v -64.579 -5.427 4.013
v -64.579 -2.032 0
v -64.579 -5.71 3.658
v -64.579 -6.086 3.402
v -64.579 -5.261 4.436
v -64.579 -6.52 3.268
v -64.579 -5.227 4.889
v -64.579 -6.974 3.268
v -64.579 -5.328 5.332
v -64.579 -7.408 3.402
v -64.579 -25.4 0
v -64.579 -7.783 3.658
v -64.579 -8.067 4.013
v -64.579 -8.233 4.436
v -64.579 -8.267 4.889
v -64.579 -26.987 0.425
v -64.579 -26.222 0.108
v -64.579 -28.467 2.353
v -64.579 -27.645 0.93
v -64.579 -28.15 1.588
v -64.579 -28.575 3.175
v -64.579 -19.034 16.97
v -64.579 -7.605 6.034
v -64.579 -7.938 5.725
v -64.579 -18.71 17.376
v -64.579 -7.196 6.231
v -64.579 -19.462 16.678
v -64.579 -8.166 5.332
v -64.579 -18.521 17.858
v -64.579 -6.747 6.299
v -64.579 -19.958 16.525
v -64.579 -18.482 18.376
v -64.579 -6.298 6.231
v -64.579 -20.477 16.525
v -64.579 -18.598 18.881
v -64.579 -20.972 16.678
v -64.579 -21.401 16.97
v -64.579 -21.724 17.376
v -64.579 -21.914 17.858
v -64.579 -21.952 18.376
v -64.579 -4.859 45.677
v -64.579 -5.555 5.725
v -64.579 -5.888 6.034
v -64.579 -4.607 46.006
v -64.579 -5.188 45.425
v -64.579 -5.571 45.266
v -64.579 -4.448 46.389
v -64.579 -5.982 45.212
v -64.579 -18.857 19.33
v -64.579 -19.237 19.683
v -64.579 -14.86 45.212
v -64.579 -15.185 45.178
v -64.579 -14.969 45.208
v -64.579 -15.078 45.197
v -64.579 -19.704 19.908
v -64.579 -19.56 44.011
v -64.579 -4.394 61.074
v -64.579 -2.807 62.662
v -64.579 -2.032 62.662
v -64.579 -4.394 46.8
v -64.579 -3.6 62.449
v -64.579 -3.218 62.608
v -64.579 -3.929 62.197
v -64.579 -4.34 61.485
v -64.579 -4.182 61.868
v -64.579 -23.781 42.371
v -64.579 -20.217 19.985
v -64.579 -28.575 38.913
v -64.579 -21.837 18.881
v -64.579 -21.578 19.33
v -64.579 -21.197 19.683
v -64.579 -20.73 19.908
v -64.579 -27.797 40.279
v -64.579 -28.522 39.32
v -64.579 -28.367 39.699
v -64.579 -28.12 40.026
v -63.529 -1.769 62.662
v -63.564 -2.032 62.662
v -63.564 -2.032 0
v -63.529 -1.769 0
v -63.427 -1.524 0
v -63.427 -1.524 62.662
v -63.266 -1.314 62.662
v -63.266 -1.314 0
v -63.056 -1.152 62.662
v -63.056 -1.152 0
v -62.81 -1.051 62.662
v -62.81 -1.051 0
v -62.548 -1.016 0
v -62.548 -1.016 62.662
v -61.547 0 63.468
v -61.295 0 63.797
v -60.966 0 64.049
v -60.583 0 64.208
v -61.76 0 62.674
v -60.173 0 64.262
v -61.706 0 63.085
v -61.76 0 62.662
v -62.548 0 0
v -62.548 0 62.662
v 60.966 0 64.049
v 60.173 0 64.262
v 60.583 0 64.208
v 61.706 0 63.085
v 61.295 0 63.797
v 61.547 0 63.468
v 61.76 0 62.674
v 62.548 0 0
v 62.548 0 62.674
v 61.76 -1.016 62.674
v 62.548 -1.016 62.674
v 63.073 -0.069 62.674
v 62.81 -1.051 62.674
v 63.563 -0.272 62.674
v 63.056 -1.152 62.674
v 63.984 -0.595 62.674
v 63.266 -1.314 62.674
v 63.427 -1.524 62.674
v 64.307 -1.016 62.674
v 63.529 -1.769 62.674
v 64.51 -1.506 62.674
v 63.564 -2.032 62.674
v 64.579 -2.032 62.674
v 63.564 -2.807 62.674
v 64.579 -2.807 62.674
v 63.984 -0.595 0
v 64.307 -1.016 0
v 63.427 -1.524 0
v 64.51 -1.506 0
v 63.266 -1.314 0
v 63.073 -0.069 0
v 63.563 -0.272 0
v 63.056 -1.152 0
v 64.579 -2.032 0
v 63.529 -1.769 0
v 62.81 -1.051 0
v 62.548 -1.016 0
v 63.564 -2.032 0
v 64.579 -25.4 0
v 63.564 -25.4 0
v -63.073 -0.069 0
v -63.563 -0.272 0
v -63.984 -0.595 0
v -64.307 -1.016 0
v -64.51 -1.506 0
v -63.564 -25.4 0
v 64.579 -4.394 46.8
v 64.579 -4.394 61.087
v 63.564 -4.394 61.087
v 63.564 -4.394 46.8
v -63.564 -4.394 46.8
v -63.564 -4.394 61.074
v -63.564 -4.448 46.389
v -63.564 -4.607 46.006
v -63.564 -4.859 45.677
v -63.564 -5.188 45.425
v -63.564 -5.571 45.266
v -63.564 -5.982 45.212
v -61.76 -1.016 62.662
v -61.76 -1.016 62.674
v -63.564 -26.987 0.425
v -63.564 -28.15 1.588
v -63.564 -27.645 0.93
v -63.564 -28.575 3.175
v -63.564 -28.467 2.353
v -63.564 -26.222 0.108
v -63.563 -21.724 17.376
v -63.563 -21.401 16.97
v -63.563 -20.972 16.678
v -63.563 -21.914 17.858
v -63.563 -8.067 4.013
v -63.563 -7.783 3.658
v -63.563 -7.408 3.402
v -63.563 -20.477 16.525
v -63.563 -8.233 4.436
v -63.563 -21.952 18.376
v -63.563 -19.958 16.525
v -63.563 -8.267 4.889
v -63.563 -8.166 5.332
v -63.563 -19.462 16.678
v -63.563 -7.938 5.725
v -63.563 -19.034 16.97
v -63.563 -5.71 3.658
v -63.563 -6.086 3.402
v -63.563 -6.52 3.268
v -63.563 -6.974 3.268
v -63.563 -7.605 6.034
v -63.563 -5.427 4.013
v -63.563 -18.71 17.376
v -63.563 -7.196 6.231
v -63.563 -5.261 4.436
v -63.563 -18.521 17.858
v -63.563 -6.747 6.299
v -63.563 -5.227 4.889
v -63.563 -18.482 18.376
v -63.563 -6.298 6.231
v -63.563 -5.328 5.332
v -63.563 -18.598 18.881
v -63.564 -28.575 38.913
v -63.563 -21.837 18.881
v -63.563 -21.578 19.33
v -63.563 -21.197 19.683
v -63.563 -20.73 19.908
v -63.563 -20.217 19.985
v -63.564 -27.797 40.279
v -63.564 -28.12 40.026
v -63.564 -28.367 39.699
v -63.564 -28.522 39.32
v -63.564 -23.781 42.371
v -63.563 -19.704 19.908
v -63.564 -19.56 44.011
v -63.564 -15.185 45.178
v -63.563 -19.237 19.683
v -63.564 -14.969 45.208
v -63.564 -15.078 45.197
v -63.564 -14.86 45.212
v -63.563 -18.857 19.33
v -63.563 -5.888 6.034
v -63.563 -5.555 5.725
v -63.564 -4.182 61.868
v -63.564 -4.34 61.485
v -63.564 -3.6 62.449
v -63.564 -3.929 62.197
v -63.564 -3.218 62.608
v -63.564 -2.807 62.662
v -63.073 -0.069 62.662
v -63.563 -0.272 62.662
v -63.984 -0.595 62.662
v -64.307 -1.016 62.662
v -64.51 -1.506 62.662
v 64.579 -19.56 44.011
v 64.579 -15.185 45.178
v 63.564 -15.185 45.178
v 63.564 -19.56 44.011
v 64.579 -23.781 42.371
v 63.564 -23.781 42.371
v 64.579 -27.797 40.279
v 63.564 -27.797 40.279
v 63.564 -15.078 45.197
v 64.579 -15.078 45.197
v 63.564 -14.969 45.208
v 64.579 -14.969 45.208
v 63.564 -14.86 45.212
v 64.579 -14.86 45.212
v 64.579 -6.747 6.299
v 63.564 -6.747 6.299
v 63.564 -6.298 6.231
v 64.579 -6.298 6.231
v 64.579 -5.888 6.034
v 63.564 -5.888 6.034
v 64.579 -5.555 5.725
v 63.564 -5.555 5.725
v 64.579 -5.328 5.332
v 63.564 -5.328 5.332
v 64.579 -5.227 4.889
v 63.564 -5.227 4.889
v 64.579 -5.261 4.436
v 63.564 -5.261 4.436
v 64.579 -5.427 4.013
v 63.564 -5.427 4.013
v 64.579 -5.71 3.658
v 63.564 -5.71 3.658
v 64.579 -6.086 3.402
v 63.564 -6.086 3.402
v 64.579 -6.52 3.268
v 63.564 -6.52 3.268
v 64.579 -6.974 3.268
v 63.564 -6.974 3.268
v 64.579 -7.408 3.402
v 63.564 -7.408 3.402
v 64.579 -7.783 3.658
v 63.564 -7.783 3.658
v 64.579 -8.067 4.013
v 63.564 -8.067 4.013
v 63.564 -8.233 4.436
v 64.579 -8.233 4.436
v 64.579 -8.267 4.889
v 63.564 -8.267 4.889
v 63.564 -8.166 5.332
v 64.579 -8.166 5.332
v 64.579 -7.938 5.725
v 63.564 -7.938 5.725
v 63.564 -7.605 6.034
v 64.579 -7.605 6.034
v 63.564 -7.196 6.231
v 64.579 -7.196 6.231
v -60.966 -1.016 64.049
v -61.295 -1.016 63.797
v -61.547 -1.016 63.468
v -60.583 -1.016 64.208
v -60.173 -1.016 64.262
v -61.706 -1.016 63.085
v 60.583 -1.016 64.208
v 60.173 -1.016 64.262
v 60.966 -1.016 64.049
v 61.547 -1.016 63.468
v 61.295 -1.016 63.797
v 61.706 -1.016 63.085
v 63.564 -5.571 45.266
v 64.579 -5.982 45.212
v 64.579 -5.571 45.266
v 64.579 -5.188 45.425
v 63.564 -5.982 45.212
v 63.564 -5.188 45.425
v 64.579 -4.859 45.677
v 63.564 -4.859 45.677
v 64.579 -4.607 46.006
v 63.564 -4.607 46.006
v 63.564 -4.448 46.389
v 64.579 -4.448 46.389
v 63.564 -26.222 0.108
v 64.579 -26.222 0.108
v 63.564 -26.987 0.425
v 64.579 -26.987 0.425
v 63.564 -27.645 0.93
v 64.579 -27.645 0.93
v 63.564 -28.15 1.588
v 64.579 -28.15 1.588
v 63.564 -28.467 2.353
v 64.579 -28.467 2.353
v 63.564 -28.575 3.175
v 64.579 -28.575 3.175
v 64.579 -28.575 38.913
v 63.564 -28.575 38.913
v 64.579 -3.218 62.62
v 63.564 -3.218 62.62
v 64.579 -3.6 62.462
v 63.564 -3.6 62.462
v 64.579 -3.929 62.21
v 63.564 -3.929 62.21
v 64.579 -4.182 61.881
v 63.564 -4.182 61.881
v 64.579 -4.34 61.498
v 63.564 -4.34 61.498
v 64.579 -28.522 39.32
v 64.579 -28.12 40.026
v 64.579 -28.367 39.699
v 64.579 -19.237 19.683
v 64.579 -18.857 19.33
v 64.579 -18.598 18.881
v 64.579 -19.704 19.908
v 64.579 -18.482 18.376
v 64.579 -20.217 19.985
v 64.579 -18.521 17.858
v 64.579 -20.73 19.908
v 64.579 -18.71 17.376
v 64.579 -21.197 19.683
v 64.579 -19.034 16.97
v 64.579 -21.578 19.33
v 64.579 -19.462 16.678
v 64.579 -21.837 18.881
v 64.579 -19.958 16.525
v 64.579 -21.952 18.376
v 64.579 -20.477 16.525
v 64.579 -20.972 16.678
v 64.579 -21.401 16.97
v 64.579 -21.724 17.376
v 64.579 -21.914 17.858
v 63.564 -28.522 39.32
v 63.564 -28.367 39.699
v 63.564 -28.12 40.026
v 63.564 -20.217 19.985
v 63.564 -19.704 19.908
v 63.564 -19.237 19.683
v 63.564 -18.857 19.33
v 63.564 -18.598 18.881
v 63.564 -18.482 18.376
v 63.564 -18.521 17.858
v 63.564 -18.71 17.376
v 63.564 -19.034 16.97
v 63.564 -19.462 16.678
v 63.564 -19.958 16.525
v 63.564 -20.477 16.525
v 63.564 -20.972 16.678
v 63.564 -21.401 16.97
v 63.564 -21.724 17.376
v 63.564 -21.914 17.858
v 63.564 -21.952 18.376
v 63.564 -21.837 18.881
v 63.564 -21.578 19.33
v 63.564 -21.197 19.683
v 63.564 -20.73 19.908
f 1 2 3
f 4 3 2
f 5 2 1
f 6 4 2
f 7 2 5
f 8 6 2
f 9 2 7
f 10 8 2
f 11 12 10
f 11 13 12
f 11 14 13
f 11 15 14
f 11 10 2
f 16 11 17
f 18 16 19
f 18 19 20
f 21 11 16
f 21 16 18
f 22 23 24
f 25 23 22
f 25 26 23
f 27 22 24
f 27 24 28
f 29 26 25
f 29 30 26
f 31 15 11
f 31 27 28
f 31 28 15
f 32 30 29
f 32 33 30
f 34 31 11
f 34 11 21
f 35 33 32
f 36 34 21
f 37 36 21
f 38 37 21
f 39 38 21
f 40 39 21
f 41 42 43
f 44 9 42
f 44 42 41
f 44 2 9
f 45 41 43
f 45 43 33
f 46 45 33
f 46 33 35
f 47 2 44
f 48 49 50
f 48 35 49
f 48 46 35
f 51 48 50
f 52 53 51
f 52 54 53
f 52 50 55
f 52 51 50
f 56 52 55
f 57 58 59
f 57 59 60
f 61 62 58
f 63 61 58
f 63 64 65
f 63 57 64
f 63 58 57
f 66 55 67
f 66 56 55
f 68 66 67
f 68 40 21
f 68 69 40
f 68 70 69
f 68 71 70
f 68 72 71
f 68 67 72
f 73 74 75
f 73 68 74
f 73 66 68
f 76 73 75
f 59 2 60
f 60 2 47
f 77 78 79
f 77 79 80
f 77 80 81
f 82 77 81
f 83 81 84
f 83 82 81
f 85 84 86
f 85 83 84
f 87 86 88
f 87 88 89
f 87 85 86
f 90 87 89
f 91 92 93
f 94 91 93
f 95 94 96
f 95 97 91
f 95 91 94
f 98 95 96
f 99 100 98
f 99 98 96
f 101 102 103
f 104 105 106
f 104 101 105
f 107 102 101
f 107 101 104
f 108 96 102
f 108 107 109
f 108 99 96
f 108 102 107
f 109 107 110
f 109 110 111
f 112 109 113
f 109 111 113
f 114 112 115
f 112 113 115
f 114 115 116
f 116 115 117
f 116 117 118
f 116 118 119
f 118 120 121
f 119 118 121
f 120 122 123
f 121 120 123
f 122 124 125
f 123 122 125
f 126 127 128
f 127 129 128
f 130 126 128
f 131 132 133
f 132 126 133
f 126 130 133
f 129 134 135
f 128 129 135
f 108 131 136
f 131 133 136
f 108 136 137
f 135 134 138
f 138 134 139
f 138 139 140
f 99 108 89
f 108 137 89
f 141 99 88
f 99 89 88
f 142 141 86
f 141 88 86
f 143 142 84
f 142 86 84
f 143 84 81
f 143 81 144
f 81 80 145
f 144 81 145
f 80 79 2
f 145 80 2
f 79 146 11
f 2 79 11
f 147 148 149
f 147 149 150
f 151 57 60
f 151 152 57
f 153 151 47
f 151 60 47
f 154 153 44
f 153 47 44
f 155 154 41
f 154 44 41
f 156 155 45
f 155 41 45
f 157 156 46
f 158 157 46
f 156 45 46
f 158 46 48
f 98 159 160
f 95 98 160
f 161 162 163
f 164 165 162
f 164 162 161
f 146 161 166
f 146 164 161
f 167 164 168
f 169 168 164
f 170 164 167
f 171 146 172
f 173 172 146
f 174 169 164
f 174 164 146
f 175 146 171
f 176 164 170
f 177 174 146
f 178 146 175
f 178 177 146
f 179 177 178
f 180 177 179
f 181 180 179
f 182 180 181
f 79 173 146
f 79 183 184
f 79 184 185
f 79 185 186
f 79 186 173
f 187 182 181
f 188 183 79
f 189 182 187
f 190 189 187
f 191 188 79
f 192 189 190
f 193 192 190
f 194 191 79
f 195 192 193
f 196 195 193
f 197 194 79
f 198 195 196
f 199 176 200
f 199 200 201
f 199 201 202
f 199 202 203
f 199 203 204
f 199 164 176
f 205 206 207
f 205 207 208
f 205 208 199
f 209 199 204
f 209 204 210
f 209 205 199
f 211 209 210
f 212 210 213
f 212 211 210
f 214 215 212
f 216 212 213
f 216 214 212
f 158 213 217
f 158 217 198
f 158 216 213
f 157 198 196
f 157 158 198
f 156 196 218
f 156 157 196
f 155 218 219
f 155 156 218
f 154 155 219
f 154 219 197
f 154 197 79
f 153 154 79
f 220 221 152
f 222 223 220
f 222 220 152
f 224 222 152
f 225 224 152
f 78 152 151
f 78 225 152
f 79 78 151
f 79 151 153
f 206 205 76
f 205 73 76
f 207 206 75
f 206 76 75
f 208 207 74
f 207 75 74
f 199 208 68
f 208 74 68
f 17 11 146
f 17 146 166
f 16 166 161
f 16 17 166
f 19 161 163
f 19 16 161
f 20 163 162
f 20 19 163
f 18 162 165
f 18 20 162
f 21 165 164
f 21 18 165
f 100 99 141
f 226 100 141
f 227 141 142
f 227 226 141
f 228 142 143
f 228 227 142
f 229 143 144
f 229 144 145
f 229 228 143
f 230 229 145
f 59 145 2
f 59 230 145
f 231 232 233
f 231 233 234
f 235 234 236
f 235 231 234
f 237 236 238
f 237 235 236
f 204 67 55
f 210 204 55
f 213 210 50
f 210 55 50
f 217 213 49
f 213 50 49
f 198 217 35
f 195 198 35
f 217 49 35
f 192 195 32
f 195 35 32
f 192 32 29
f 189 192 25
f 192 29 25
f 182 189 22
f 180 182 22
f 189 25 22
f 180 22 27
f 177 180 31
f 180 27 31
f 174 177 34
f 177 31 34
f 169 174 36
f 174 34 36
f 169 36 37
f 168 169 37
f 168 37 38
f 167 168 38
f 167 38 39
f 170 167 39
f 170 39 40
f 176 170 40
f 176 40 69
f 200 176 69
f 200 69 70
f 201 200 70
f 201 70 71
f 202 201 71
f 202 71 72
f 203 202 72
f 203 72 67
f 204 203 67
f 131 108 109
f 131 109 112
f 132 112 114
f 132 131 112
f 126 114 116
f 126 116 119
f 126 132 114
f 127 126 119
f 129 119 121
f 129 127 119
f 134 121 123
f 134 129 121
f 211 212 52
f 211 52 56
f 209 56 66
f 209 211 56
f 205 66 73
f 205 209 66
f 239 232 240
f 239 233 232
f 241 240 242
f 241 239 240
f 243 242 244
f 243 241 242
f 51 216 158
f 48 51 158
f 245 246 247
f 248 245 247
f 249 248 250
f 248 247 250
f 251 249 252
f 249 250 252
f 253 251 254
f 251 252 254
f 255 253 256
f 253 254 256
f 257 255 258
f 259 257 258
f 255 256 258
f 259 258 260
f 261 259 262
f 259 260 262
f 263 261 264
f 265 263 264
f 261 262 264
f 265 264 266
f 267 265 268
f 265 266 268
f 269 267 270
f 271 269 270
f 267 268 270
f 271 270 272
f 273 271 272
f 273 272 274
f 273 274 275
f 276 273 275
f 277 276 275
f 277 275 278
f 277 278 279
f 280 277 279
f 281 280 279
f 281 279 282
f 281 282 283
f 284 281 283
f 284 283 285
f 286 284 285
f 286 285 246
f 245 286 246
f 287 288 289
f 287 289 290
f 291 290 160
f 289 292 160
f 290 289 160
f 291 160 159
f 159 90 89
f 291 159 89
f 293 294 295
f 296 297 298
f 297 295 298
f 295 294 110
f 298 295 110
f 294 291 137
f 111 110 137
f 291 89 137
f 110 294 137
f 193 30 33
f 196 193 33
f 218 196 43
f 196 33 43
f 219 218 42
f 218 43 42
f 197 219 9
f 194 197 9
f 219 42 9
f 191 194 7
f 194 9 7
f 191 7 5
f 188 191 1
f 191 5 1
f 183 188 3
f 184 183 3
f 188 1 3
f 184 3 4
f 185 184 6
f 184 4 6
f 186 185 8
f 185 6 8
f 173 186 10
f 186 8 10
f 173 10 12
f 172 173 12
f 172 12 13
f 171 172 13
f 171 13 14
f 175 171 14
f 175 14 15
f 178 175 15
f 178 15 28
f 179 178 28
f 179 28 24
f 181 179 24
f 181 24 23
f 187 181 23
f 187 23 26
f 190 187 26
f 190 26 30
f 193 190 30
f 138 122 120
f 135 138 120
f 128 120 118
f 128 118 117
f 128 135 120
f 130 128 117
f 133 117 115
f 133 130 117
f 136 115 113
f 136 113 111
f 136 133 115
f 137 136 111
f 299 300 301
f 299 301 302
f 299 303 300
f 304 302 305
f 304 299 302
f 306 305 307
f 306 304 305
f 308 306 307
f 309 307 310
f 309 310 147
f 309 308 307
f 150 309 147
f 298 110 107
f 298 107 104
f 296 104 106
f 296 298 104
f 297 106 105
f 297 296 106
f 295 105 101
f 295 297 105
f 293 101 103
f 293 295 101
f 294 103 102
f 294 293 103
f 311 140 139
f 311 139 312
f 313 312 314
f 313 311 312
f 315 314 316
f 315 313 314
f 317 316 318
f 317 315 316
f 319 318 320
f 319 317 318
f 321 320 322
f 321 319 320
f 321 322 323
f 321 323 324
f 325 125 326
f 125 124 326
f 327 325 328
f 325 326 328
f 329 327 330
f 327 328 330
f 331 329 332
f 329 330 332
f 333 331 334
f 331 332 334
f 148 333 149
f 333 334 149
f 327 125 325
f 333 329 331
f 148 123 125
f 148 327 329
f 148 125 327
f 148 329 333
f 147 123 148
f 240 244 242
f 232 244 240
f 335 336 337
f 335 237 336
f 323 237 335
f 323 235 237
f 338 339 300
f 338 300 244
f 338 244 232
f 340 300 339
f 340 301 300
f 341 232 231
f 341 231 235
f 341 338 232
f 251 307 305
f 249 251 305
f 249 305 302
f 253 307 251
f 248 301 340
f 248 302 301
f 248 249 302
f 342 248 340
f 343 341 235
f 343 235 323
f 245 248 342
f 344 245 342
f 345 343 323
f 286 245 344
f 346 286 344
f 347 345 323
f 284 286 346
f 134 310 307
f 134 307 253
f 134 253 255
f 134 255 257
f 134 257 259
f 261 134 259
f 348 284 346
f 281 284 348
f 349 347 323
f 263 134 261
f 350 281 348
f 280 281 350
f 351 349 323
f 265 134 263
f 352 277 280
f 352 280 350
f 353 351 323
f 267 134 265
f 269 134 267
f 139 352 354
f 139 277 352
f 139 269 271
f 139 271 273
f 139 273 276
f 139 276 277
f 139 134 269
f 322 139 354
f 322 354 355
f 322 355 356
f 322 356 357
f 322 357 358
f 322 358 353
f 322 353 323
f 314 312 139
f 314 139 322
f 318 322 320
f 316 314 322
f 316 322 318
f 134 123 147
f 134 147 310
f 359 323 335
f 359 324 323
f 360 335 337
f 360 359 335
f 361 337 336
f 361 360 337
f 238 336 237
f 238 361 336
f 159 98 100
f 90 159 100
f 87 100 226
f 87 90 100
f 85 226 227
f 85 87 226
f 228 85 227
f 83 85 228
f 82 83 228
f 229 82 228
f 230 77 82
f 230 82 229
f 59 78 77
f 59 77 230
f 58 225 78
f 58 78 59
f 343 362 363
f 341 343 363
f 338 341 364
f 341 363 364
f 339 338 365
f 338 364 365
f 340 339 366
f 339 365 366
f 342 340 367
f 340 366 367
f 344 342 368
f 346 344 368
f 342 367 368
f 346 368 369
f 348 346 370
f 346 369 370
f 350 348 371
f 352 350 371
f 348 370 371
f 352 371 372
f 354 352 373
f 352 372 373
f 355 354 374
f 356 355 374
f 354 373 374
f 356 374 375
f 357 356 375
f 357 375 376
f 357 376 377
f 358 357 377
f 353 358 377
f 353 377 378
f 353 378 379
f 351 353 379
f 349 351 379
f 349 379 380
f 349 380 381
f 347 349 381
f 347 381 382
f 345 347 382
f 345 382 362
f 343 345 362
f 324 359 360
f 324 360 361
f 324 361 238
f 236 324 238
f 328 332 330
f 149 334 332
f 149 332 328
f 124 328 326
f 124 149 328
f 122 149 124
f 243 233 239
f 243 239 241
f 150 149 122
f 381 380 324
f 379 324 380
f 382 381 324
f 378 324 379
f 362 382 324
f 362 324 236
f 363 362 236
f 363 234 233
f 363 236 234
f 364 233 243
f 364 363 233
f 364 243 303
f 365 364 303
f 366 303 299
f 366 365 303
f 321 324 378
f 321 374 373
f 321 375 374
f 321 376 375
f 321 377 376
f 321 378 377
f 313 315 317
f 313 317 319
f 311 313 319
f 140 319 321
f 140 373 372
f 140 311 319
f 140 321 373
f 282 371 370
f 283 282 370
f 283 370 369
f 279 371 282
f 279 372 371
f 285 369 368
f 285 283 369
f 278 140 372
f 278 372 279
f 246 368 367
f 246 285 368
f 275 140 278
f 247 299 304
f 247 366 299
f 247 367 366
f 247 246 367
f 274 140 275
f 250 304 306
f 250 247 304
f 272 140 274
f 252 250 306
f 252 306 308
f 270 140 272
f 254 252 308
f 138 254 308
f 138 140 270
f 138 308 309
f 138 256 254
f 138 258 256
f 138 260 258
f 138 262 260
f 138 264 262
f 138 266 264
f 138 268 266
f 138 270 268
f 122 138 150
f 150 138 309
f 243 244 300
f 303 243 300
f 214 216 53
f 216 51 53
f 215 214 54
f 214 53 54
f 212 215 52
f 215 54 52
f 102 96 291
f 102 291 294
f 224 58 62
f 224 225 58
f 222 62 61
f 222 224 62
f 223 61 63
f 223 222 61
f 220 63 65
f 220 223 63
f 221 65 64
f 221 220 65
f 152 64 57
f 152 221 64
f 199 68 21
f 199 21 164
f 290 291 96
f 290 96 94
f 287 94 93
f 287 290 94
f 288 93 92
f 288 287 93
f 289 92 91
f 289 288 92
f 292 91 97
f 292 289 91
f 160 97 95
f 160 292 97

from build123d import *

# Parameters (mm, degrees)
SKETCH1_W                       = 129.159
SKETCH1_H                       = 1.016
BASE_FLANGE1_DEPTH              = 64.262
EDGE_FLANGE1_STRIP_W            = 6.096
EDGE_FLANGE1_STRIP_H            = 1.016
EDGE_FLANGE1_STRIP_CUT_DEPTH    = 62.6745
EDGE_FLANGE1_RELIEF_W           = 6.8834
EDGE_FLANGE1_RELIEF_H           = 1.6002
EDGE_FLANGE1_RELIEF_CUT_DEPTH   = 1.016
EDGE_FLANGE1_STRIP_2_W          = 6.096
EDGE_FLANGE1_STRIP_2_H          = 1.016
EDGE_FLANGE1_STRIP_CUT_2_DEPTH  = 62.6618
EDGE_FLANGE1_RELIEF_2_W         = 6.8834
EDGE_FLANGE1_RELIEF_2_H         = 1.6002
EDGE_FLANGE1_RELIEF_CUT_2_DEPTH = 1.016
EDGE_FLANGE1_DEPTH              = 62.6745
EDGE_FLANGE1_BEND_DEPTH         = 62.6618
BREAK_CORNER1_START             = -64.5795
BREAK_CORNER1_DEPTH             = 129.159
F_1_8_0_125_DIAMETER_HOLE1_D    = 3.048
BREAK_CORNER2_START             = -1.016
BREAK_CORNER2_DEPTH             = 1.016
F_1_8_0_125_DIAMETER_HOLE4_D    = 3.4798
SKETCH20_W                      = 17.4625
SKETCH20_H                      = 24.1808
CUT_EXTRUDE4_DEPTH              = 148.065232295
CUT_EXTRUDE5_DEPTH              = 148.065232295
FILLET3_R                       = 1.5875


# Read off the part's stored shape, not the designer's step: Break-Corner1, Break-Corner2
# Sheet-metal steps are written as plain solids
with BuildPart() as part:
    # Sketch1 → Base-Flange1 (new body)
    with BuildSketch(Plane.XY):
        with Locations((0, -0.508)):
            Rectangle(SKETCH1_W, SKETCH1_H)
    extrude(amount=BASE_FLANGE1_DEPTH)

    # Edge-Flange1 strip (across the edge) → Edge-Flange1 strip cut (cut)
    with BuildSketch(Plane(origin=(64.5795, -1.016, 0), x_dir=(-1, 0, 0), z_dir=(0, 0, 1))):
        with Locations((-1.016, -0.508)):
            Rectangle(EDGE_FLANGE1_STRIP_W, EDGE_FLANGE1_STRIP_H)
    extrude(amount=EDGE_FLANGE1_STRIP_CUT_DEPTH, mode=Mode.SUBTRACT)

    # Edge-Flange1 relief (on the sheet) → Edge-Flange1 relief cut (cut)
    with BuildSketch(Plane(origin=(62.5475, -1.016, 0), x_dir=(-1, 0, 0), z_dir=(0, -1, 0))):
        with Locations((-2.6543, -63.4746)):
            Rectangle(EDGE_FLANGE1_RELIEF_W, EDGE_FLANGE1_RELIEF_H)
    extrude(amount=-EDGE_FLANGE1_RELIEF_CUT_DEPTH, mode=Mode.SUBTRACT)

    # Edge-Flange1 strip 2 (across the edge) → Edge-Flange1 strip cut 2 (cut)
    with BuildSketch(Plane(origin=(-64.5795, -1.016, 62.6618), x_dir=(1, 0, 0), z_dir=(0, 0, -1))):
        with Locations((-1.016, -0.508)):
            Rectangle(EDGE_FLANGE1_STRIP_2_W, EDGE_FLANGE1_STRIP_2_H)
    extrude(amount=EDGE_FLANGE1_STRIP_CUT_2_DEPTH, mode=Mode.SUBTRACT)

    # Edge-Flange1 relief 2 (on the sheet) → Edge-Flange1 relief cut 2 (cut)
    with BuildSketch(Plane(origin=(-62.5475, -1.016, 62.6618), x_dir=(1, 0, 0), z_dir=(0, -1, 0))):
        with Locations((-2.6543, 0.8001)):
            Rectangle(EDGE_FLANGE1_RELIEF_2_W, EDGE_FLANGE1_RELIEF_2_H)
    extrude(amount=-EDGE_FLANGE1_RELIEF_CUT_2_DEPTH, mode=Mode.SUBTRACT)

    # Edge-Flange1 section (across the edge) → Edge-Flange1 (add)
    with BuildSketch(Plane(origin=(64.5795, -1.016, 0), x_dir=(-1, 0, 0), z_dir=(0, 0, 1))):
        with BuildLine():
            Line((0, 1.016), (0, 27.559))
            Line((0, 27.559), (1.016, 27.559))
            Line((1.016, 27.559), (1.016, 1.016))
            ThreePointArc((1.016, 1.016), (1.31357951, 0.29757951), (2.032, 0))
            Line((2.032, 0), (2.032, -1.016))
            ThreePointArc((2.032, -1.016), (0.595159021, -0.420840979), (0, 1.016))
        make_face()
    extrude(amount=EDGE_FLANGE1_DEPTH)

    # Edge-Flange1 section 2 (across the edge) → Edge-Flange1 bend (add)
    with BuildSketch(Plane(origin=(-64.5795, -1.016, 62.6618), x_dir=(1, 0, 0), z_dir=(0, 0, -1))):
        with BuildLine():
            Line((0, 1.016), (0, 27.559))
            Line((0, 27.559), (1.016, 27.559))
            Line((1.016, 27.559), (1.016, 1.016))
            ThreePointArc((1.016, 1.016), (1.31357951, 0.29757951), (2.032, 0))
            Line((2.032, 0), (2.032, -1.016))
            ThreePointArc((2.032, -1.016), (0.595159021, -0.420840979), (0, 1.016))
        make_face()
    extrude(amount=EDGE_FLANGE1_BEND_DEPTH)

    # Break-Corner1 outline → Break-Corner1 (cut)
    with BuildSketch(Plane.YZ.offset(BREAK_CORNER1_START)):
        with BuildLine():
            ThreePointArc((-25.4, 0), (-27.64506403, 0.92993597), (-28.575, 3.175))
            Line((-28.575, 3.175), (-28.575, 0))
            Line((-28.575, 0), (-25.4, 0))
        make_face()
    extrude(amount=BREAK_CORNER1_DEPTH, mode=Mode.SUBTRACT)

    # 1/8 (0.125) Diameter Hole1 (through all)
    with Locations(Plane(origin=(64.5795, 0, 0), x_dir=(0, 0, -1), z_dir=(1, 0, 0))):
        with Locations((-4.7752, -6.746875)):
            Hole(F_1_8_0_125_DIAMETER_HOLE1_D / 2)

    # Break-Corner2 outline → Break-Corner2 (cut)
    with BuildSketch(Plane(origin=(0, 0, 0), x_dir=(1, 0, 0), z_dir=(0, 1, 0)).offset(BREAK_CORNER2_START)):
        with BuildLine():
            Line((-61.7601, -64.262), (-60.1726, -64.262))
            ThreePointArc((-60.1726, -64.262), (-61.295132015, -63.797032015), (-61.7601, -62.6745))
            Line((-61.7601, -62.6745), (-61.7601, -64.262))
        make_face()
        with BuildLine():
            ThreePointArc((61.7601, -62.6745), (61.295132015, -63.797032015), (60.1726, -64.262))
            Line((60.1726, -64.262), (61.7601, -64.262))
            Line((61.7601, -64.262), (61.7601, -62.6745))
        make_face()
    extrude(amount=BREAK_CORNER2_DEPTH, mode=Mode.SUBTRACT)

    # 1/8 (0.125) Diameter Hole4 (through all)
    with Locations(Plane(origin=(64.5795, 0, 0), x_dir=(0, 0, -1), z_dir=(1, 0, 0))):
        with Locations((-18.245584182, -20.217259182)):
            Hole(F_1_8_0_125_DIAMETER_HOLE4_D / 2)

    # Sketch20 → Cut-Extrude4 (cut, through all)
    with BuildSketch(Plane(origin=(64.5795, 0, 0), x_dir=(0, 0, -1), z_dir=(1, 0, 0))):
        with Locations((-53.94325, -16.4846)):
            Rectangle(SKETCH20_W, SKETCH20_H)
    extrude(amount=-CUT_EXTRUDE4_DEPTH, mode=Mode.SUBTRACT)

    # Sketch21 → Cut-Extrude5 (cut, through all)
    with BuildSketch(Plane(origin=(64.5795, 0, 0), x_dir=(0, 0, -1), z_dir=(1, 0, 0))):
        with BuildLine():
            Line((-39.806023342, -28.575), (-45.212, -28.575))
            Line((-45.212, -28.575), (-45.212, -15.022793726))
            ThreePointArc((-45.212, -15.022793726), (-43.112598411, -22.039667684), (-39.806023342, -28.575))
        make_face()
    extrude(amount=-CUT_EXTRUDE5_DEPTH, mode=Mode.SUBTRACT)

    # Fillet3
    fillet3_edges = [part.edges().sort_by_distance(p)[0] for p in [
        (64.0715, -4.3942, 62.6745),
        (-64.0715, -4.3942, 62.6618),
        (64.0715, -4.3942, 45.212),
        (-64.0715, -4.3942, 45.212),
        (64.0715, -15.022793726, 45.212),
        (64.0715, -28.575, 39.806023342),
        (-64.0715, -15.022793726, 45.212),
        (-64.0715, -28.575, 39.806023342),
    ]]
    fillet(fillet3_edges, radius=FILLET3_R)


solid = part.part
